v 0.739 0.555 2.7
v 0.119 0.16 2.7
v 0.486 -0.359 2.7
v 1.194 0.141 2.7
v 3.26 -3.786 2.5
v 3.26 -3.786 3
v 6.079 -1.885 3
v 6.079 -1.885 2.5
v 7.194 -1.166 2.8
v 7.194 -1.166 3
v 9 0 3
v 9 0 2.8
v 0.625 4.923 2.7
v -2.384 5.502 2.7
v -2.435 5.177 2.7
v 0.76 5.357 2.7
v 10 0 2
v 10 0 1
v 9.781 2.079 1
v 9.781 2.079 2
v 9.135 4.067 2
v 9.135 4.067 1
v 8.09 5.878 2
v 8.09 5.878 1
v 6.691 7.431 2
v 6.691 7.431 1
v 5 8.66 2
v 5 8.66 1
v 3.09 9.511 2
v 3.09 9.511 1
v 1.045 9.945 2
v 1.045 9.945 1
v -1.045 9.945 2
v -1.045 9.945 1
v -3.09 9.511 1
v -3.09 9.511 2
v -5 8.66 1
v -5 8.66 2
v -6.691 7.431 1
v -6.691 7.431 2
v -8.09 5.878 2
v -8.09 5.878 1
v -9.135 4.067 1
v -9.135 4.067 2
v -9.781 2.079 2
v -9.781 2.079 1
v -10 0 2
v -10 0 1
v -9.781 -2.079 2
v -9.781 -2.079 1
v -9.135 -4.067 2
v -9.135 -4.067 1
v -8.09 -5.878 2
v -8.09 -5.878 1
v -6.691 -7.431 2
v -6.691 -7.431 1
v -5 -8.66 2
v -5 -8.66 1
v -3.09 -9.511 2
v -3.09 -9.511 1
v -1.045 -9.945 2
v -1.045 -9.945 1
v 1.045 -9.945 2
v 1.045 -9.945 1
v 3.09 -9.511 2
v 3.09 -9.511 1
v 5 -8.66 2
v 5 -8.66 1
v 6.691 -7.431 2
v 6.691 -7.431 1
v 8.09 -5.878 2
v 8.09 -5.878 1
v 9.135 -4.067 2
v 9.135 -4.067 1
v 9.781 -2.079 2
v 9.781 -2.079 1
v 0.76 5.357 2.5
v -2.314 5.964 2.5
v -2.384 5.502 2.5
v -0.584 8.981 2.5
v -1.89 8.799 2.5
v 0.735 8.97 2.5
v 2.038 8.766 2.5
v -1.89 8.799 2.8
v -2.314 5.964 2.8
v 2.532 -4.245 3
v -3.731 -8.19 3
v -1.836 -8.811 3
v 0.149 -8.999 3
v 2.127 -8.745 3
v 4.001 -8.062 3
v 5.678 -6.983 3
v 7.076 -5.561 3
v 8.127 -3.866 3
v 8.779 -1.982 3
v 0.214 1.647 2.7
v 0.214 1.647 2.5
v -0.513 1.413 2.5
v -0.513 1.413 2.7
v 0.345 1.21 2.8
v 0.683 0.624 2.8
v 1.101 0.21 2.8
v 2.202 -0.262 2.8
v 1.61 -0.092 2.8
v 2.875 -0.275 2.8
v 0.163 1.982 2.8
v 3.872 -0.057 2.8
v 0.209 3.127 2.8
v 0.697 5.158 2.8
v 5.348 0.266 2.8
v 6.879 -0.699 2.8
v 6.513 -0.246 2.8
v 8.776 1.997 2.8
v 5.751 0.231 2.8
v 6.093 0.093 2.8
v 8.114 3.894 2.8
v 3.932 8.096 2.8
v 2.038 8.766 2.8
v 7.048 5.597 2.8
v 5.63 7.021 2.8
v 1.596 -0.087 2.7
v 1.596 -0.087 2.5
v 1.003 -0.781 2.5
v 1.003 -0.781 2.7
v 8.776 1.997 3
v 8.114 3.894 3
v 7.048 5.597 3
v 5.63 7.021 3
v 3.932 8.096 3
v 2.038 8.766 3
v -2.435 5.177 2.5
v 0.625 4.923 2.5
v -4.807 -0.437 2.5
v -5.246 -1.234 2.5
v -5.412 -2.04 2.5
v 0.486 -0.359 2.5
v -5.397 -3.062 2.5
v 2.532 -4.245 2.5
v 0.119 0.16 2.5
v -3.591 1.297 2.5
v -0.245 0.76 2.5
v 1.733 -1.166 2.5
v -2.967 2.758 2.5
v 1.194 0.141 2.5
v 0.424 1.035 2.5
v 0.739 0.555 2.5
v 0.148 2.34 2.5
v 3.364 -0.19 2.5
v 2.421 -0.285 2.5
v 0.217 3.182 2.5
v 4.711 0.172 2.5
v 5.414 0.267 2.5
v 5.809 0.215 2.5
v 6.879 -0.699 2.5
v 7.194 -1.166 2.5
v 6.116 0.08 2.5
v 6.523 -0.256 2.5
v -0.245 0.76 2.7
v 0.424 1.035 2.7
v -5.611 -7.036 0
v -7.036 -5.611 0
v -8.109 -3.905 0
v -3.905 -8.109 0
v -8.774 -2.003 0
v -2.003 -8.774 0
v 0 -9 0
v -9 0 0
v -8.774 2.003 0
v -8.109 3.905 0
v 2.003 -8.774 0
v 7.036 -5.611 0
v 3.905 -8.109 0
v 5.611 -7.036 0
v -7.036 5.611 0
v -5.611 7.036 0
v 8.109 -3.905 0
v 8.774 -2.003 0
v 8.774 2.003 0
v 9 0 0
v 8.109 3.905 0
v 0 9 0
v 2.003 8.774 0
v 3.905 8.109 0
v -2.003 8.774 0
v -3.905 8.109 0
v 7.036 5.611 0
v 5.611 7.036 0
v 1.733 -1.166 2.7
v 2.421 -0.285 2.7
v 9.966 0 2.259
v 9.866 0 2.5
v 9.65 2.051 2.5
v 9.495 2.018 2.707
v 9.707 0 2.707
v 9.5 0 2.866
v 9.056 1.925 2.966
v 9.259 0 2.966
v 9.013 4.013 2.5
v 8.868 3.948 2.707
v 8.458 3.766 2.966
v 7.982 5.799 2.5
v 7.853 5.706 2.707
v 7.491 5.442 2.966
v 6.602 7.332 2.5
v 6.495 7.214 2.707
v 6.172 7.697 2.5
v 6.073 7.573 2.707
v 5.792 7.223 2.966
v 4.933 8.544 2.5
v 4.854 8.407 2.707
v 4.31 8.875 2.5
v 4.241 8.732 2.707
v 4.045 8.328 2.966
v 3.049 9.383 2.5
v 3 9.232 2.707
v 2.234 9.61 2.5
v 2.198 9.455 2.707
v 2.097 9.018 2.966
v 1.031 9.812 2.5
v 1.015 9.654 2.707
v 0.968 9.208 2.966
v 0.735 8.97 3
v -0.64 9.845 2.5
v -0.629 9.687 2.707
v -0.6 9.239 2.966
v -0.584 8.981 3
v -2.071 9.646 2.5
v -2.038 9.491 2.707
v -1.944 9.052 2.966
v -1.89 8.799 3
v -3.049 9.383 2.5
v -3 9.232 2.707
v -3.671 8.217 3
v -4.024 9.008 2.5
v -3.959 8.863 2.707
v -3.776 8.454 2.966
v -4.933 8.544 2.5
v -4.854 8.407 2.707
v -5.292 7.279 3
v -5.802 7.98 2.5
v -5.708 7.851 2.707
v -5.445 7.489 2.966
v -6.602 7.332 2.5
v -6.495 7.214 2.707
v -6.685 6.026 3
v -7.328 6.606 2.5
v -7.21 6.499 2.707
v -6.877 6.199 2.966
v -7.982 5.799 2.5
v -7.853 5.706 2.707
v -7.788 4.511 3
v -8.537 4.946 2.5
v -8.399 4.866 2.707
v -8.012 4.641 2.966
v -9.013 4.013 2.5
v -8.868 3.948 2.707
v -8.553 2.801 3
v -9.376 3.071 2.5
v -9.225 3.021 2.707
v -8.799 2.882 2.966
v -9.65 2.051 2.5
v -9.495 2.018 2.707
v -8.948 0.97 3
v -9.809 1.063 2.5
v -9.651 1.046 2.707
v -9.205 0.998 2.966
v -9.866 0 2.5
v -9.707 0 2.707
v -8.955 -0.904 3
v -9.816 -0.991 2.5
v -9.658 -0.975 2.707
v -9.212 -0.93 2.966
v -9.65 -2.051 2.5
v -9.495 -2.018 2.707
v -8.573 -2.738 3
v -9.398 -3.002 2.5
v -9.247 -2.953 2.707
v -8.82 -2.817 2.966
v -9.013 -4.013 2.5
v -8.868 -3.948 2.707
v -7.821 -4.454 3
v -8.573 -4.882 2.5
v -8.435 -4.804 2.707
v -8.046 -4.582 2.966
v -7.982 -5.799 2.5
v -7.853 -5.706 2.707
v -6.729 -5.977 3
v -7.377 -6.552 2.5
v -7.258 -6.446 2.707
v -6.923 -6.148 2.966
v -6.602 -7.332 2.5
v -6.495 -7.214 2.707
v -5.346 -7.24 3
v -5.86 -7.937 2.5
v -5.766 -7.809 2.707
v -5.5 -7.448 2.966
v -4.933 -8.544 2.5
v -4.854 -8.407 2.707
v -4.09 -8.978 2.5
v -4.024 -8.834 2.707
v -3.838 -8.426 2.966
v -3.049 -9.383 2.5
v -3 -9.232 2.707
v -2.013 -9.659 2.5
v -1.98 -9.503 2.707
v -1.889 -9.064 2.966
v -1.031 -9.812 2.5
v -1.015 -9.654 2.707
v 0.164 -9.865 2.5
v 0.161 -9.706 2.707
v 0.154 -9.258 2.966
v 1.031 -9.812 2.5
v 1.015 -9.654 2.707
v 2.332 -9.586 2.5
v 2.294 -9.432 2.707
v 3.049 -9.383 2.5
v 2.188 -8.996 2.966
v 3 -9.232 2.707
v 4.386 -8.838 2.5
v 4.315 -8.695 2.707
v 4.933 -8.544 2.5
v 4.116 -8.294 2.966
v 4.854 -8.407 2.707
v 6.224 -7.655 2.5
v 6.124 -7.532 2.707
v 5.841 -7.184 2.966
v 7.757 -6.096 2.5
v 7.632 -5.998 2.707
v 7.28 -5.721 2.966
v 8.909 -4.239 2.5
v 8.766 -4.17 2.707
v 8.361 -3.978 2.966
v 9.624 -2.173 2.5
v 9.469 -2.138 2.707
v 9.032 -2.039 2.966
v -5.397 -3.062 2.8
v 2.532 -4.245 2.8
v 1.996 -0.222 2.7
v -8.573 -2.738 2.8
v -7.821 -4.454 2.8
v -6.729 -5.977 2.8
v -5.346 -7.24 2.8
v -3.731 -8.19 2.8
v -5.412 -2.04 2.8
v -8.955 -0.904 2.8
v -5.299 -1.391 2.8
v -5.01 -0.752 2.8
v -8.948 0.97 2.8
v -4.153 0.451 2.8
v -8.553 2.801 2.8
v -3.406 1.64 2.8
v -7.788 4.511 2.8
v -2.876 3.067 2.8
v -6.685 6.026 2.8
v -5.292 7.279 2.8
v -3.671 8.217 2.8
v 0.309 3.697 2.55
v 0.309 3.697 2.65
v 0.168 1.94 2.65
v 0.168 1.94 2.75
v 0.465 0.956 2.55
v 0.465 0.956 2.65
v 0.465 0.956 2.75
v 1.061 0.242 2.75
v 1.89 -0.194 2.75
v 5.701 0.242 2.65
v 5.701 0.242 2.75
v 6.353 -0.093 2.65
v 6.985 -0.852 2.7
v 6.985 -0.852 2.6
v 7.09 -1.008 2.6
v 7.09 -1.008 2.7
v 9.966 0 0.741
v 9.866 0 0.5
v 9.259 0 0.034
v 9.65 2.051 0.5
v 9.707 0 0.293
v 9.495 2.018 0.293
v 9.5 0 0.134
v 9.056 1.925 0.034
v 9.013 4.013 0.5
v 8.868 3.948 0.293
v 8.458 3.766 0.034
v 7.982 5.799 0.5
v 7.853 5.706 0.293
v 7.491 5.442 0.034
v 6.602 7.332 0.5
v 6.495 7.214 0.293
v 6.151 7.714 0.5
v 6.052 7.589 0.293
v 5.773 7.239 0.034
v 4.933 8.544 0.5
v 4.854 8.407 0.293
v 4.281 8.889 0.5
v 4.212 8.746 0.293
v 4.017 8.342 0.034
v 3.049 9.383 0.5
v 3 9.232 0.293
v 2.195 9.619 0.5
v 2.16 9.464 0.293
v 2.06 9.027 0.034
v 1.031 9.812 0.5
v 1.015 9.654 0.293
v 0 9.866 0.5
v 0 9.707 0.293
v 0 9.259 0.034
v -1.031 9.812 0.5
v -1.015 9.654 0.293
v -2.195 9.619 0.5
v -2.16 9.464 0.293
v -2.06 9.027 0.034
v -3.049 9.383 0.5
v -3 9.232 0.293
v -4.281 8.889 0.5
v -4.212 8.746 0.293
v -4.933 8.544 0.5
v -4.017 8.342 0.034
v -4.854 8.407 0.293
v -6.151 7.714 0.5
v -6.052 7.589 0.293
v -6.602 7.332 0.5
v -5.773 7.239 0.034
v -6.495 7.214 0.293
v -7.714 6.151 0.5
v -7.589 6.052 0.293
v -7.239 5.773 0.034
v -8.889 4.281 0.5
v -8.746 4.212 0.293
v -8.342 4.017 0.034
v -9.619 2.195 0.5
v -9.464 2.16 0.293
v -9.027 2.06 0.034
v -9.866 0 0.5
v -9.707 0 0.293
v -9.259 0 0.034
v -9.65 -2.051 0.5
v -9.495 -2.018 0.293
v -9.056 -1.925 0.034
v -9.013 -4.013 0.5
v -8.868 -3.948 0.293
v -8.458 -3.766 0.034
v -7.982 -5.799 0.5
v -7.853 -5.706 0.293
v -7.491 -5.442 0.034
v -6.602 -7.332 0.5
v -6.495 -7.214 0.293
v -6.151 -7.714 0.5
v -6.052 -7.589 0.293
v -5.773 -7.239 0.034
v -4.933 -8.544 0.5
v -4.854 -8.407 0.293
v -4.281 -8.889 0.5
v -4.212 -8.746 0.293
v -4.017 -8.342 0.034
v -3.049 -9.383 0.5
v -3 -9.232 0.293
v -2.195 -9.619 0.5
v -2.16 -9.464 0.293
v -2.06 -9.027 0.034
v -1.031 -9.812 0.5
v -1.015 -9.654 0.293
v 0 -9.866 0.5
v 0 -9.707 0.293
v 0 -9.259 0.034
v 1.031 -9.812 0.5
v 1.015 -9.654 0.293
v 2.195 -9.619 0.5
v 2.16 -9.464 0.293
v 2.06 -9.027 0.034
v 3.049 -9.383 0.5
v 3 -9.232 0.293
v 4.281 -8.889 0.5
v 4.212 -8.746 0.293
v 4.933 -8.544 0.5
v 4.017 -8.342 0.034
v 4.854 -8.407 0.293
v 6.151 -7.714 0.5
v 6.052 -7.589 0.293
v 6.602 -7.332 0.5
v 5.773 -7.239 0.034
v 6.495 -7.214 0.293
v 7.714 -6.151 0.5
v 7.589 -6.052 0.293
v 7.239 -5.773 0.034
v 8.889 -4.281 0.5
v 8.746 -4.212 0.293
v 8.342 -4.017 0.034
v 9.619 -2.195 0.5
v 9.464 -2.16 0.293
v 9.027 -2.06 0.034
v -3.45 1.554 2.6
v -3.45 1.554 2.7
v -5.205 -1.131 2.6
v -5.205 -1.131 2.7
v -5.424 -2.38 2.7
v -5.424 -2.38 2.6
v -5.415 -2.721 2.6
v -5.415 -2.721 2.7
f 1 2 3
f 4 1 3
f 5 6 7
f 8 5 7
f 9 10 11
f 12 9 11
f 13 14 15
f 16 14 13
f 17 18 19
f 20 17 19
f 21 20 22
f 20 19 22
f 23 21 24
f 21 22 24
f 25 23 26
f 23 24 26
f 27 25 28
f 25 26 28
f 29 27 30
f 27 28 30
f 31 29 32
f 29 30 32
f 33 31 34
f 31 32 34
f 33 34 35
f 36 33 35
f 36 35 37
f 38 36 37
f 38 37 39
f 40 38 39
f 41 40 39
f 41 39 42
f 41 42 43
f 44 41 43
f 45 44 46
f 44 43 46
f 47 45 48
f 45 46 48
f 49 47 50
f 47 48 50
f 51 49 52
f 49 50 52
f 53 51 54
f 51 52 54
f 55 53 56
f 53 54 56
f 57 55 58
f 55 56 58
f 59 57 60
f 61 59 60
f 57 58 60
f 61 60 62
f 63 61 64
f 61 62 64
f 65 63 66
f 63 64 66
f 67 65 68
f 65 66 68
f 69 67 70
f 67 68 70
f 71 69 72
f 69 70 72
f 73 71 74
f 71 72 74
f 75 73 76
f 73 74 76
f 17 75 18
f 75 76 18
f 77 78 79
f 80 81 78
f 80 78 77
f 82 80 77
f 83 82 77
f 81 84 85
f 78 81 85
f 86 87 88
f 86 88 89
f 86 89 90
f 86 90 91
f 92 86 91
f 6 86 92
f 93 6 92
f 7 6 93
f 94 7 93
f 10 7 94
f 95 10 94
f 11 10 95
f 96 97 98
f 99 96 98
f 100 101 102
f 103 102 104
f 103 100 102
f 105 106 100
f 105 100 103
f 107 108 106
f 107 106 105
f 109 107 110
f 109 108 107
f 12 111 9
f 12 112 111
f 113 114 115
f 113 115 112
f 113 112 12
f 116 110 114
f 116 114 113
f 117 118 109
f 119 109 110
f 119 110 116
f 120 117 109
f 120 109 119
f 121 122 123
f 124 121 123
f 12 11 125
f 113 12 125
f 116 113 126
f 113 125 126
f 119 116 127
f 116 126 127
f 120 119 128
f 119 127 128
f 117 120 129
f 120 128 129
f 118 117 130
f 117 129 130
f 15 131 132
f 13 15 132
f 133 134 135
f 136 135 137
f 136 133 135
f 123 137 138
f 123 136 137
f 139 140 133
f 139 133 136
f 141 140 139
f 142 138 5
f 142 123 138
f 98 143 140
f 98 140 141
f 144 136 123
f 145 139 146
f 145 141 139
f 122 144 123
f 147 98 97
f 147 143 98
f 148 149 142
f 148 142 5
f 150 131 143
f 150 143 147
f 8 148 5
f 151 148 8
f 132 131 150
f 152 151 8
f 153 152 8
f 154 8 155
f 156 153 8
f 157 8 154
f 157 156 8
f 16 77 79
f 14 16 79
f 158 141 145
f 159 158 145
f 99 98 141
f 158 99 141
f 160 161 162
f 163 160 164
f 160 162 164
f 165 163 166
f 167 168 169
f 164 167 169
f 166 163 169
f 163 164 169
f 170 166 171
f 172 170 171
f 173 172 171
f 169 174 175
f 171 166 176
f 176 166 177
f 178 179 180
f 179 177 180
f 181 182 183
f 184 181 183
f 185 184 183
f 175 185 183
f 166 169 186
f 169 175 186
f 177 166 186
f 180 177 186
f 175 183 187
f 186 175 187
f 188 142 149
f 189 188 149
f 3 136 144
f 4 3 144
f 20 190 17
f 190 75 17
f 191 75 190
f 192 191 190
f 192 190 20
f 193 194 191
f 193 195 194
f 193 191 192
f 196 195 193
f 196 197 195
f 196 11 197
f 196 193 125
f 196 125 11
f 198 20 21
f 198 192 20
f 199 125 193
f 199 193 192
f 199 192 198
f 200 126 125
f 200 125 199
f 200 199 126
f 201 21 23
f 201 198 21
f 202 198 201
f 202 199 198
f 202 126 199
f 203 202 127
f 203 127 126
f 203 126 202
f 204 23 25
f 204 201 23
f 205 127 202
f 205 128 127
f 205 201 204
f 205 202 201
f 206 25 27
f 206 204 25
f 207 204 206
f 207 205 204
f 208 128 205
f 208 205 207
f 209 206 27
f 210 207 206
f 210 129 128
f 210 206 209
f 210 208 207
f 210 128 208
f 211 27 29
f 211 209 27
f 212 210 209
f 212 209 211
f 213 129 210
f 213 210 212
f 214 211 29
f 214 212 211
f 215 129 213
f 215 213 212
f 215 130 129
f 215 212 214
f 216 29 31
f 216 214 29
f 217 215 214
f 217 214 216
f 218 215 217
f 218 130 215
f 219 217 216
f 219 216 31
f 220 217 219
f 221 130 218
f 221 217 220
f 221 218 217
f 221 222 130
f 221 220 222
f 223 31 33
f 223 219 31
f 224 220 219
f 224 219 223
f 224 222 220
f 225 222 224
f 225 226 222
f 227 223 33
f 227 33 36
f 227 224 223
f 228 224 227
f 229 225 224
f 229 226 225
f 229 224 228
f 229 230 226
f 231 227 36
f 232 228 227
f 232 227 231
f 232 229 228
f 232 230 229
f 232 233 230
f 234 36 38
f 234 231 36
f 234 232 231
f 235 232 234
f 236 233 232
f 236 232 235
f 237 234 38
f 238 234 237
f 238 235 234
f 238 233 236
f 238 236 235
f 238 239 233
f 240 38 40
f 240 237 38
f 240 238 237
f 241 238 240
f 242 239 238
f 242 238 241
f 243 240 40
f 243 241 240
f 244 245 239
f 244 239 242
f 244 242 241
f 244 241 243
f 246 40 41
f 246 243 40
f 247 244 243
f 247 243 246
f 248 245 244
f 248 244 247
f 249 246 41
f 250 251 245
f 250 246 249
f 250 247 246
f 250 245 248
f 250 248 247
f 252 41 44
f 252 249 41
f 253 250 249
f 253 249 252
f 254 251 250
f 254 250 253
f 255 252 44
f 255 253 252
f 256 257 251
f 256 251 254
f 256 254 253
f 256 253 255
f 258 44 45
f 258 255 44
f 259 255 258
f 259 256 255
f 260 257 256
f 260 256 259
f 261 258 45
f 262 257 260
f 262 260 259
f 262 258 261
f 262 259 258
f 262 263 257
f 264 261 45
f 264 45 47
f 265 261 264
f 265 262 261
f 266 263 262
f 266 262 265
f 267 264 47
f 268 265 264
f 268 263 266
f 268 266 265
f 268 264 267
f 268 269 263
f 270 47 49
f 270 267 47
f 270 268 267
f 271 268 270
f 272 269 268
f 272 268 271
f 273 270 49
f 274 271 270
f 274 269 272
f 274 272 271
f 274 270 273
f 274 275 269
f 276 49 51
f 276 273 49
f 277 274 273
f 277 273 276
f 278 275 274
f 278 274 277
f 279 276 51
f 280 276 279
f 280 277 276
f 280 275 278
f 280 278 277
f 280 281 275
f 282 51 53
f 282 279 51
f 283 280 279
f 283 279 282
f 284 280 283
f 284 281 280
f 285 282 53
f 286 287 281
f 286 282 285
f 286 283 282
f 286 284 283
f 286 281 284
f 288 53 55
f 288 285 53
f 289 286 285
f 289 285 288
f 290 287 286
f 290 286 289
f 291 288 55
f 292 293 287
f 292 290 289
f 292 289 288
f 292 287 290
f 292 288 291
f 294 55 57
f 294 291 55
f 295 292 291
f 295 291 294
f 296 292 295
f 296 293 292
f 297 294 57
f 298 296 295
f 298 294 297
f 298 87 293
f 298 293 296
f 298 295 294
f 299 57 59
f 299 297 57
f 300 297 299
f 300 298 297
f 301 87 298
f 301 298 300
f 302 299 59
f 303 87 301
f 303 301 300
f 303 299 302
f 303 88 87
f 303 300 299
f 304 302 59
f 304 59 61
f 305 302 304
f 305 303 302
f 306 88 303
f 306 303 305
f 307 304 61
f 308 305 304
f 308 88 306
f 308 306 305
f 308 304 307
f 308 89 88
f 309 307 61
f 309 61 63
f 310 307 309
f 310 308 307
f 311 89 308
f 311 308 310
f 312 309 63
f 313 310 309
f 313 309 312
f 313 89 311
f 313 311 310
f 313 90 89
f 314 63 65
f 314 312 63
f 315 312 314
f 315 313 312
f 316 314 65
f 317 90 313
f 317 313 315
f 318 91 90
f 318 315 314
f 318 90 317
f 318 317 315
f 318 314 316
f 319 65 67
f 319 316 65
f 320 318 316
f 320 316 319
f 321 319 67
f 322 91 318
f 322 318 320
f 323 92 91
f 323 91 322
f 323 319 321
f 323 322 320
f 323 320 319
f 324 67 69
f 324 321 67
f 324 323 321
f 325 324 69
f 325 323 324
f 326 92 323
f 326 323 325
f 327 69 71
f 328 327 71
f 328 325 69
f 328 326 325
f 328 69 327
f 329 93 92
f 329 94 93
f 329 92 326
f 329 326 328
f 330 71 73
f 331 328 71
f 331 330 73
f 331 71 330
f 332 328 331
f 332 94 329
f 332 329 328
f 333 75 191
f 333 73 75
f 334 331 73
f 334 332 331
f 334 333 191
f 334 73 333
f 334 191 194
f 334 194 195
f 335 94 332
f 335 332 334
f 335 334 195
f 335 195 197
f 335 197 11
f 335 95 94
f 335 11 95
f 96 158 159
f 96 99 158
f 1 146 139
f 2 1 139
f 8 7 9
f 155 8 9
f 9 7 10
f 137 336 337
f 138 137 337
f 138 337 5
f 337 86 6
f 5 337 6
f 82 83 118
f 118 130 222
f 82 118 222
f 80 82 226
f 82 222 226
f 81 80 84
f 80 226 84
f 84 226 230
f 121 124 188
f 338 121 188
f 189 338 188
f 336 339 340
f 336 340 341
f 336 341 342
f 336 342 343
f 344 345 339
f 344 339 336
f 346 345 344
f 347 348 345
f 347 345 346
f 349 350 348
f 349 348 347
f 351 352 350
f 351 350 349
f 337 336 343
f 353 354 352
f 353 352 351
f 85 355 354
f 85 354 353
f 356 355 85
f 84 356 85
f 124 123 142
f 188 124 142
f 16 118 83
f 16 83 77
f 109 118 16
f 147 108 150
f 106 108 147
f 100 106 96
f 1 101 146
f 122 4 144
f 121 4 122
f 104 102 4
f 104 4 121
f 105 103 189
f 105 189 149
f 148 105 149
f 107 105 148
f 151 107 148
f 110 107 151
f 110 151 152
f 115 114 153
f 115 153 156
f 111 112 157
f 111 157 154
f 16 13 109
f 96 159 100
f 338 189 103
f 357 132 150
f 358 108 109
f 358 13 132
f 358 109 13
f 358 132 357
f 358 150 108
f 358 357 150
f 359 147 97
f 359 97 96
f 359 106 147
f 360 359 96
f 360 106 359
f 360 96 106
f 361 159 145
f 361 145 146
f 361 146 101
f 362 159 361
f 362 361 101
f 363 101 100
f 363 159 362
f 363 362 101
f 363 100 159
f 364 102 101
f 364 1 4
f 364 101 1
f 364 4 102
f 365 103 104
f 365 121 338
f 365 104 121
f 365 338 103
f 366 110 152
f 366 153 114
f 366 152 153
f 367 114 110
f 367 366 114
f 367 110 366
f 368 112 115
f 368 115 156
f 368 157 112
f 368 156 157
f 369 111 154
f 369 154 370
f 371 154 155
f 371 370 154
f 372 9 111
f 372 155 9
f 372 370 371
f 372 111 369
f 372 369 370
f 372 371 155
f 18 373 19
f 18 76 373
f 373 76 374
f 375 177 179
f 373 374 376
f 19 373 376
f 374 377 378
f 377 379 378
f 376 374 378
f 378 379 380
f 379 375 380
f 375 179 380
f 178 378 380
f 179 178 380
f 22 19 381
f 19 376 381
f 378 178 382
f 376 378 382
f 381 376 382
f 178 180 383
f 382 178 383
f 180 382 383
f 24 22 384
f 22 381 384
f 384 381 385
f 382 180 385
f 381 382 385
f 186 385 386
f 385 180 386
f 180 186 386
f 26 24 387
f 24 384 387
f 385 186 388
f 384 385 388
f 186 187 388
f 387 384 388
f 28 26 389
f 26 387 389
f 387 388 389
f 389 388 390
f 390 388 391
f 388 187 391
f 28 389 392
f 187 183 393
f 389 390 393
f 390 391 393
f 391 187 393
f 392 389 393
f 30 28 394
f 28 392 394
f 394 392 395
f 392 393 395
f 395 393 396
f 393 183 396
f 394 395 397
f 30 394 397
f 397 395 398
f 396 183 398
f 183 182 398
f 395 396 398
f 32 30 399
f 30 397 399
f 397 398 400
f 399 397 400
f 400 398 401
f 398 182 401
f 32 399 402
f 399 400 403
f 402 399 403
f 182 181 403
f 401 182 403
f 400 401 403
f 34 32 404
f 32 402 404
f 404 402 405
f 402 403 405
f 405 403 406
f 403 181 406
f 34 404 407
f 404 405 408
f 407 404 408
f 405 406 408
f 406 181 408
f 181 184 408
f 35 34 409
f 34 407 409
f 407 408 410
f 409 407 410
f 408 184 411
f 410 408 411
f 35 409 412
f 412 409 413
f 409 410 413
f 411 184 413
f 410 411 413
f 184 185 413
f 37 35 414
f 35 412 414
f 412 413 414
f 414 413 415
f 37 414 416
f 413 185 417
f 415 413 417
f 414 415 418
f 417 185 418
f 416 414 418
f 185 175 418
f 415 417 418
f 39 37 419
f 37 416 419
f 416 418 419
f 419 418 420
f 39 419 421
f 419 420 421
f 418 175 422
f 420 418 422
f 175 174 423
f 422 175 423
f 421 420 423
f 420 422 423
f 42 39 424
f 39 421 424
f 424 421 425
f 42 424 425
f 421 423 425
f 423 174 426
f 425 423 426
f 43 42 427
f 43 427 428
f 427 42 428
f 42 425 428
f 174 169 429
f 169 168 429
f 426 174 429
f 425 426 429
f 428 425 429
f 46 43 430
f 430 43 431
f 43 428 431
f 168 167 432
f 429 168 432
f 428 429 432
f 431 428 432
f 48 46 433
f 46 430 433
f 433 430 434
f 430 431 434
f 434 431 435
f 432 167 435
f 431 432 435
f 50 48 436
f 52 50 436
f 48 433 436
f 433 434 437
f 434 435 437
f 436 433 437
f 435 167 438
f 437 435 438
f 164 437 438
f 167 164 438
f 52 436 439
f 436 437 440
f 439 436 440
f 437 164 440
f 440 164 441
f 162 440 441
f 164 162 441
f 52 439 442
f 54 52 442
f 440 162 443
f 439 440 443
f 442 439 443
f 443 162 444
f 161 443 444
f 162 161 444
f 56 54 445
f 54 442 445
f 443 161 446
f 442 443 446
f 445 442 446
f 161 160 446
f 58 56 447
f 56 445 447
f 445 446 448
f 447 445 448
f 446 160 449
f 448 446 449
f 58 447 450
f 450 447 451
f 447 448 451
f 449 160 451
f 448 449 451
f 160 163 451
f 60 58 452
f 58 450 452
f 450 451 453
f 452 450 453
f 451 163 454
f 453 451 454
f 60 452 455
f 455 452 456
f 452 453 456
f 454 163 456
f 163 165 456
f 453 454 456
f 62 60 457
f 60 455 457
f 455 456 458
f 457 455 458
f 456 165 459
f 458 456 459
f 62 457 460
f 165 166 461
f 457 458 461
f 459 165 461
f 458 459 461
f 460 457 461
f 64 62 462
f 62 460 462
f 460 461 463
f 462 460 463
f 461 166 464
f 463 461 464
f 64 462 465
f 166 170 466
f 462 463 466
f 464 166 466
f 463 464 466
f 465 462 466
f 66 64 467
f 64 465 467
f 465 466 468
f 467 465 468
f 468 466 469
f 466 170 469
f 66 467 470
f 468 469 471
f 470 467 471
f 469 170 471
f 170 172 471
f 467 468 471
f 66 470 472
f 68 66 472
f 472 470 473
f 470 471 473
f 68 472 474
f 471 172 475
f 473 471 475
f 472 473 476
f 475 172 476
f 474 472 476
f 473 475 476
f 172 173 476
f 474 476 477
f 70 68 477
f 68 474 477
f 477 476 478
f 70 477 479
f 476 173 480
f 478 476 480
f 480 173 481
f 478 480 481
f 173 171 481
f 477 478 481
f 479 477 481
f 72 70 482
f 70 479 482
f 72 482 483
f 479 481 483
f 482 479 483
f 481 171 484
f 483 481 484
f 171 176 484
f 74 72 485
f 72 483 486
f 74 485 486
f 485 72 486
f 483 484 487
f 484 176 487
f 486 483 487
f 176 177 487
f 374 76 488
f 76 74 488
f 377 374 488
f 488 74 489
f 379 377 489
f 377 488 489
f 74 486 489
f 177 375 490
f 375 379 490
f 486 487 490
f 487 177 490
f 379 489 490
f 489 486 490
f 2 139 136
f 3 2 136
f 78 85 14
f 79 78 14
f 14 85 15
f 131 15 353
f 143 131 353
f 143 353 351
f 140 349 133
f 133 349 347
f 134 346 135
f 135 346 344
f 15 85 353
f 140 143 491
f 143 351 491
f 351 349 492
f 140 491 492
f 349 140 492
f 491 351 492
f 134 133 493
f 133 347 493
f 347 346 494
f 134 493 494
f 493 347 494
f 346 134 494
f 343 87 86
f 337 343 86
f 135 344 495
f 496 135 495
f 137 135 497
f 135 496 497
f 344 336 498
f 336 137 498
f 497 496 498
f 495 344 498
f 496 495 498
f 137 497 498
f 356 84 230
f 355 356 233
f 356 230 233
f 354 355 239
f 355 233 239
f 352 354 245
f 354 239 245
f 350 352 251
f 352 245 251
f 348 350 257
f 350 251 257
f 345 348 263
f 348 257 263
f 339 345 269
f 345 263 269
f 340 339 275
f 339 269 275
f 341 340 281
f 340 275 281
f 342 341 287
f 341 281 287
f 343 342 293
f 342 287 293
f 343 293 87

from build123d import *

# Parameters (mm, degrees)
F0_R      = 10
F1_DEPTH  = 3
F2_R      = 1
F4_DEPTH  = 0.5
F5_DEPTH  = 0.5
F7_DEPTH  = 0.2
F8_DEPTH  = 0.2
F10_DEPTH = 0.2


with BuildPart() as f1:
    # F0 (on Top) → F1 (new body)
    with BuildSketch(Plane.XY):
        Circle(F0_R)
    extrude(amount=F1_DEPTH)

    # F2
    f2_edges = [f1.edges().sort_by_distance(p)[0] for p in [
        (-10, 0, 3),
        (-10, 0, 0),
    ]]
    fillet(f2_edges, radius=F2_R)

    # F3 (on face) → F4 (cut)
    with BuildSketch(Plane.XY.offset(3)):
        with BuildLine():
            Line((2.6188242033, -3.3776305377), (6.8794322408, -0.6989099297))
            add(Edge.make_bspline(
                [(2.0379616312, 8.7662256639), (1.6297293118, 7.760927147), (0.7947254097, 5.7046759771), (-0.2158731788, 1.9761788849), (0.9164418768, 0.0642277289), (2.929304388, -0.6172304518), (5.6350925737, 0.7468103985), (6.5537268756, -0.2412183766), (6.8794322408, -0.6989099297)],
                knots=[0, 0, 0, 0, 0.1908238507, 0.3903136826, 0.5337501788, 0.6776846025, 0.8516922871, 0.9633032231, 0.9633032231, 0.9633032231, 0.9633032231], degree=3))
            ThreePointArc((2.0379616312, 8.7662256639), (0.0759866512, 8.9996792181), (-1.8896505536, 8.7993875233))
            Line((-1.8896505536, 8.7993875233), (-2.3143994622, 5.9643280692))
            add(Edge.make_bspline(
                [(-2.3143994622, 5.9643280692), (-2.5209566799, 4.5856267279), (-2.998613389, 1.3974263723), (-5.1744957464, -0.6070257438), (-5.3903894892, -1.7340637252), (-5.4123916936, -2.0398823468)],
                knots=[0.2414805871, 0.2414805871, 0.2414805871, 0.2414805871, 0.5458400785, 0.8012843993, 0.8955104519, 0.8955104519, 0.8955104519, 0.8955104519], degree=3))
            Line((-5.4123916936, -2.0398823468), (2.6188242033, -3.3776305377))
        make_face()
    extrude(amount=-F4_DEPTH, mode=Mode.SUBTRACT)

    # F3 (on face) → F5 (cut)
    with BuildSketch(Plane.XY.offset(3)):
        with BuildLine():
            Line((3.2604557928, -3.7864416372), (6.0787242837, -1.8852878129))
            Line((6.0787242837, -1.8852878129), (7.1935072074, -1.1658464236))
            add(Edge.make_bspline(
                [(6.8794322408, -0.6989099297), (6.9865215417, -0.8493952261), (7.0900143745, -1.0076208248), (7.1935072074, -1.1658464236)],
                knots=[0.9633032231, 0.9633032231, 0.9633032231, 0.9633032231, 1, 1, 1, 1], degree=3))
            Line((6.8794322408, -0.6989099297), (2.6188242033, -3.3776305377))
            Line((2.6188242033, -3.3776305377), (-5.4123916936, -2.0398823468))
            add(Edge.make_bspline(
                [(-5.4123916936, -2.0398823468), (-5.4367904701, -2.3790120105), (-5.4167044889, -2.720741879), (-5.3966185078, -3.0624717474)],
                knots=[0.8955104519, 0.8955104519, 0.8955104519, 0.8955104519, 1, 1, 1, 1], degree=3))
            Line((-5.3966185078, -3.0624717474), (2.5323872936, -4.2450306214))
            Line((2.5323872936, -4.2450306214), (3.2604557928, -3.7864416372))
        make_face()
    extrude(amount=-F5_DEPTH, mode=Mode.SUBTRACT)

    # F6 (on face) → F7 (join)
    with BuildSketch(Plane.XY.offset(2.5)):
        with BuildLine():
            add(Edge.make_bspline(
                [(-2.3842653189, 5.5020927108), (-2.400709991, 5.3951104015), (-2.4176575323, 5.2866589487), (-2.4352520085, 5.1770578662)],
                knots=[0.2746404016, 0.2746404016, 0.2746404016, 0.2746404016, 0.2971489273, 0.2971489273, 0.2971489273, 0.2971489273], degree=3))
            Line((-2.4352520085, 5.1770578662), (0.625273791, 4.9229885711))
            add(Edge.make_bspline(
                [(0.760314553, 5.3573187551), (0.7143347288, 5.2141615037), (0.6690819594, 5.0691118902), (0.625273791, 4.9229885711)],
                knots=[0.2034219896, 0.2034219896, 0.2034219896, 0.2034219896, 0.2264819887, 0.2264819887, 0.2264819887, 0.2264819887], degree=3))
            Line((0.760314553, 5.3573187551), (-2.3842653189, 5.5020927108))
        make_face()
    extrude(amount=F7_DEPTH)

    # F3 (on face) → F8 (cut)
    with BuildSketch(Plane.XY.offset(3)):
        with BuildLine():
            Line((-3.7310567152, -8.1901902169), (2.5323872936, -4.2450306214))
            Line((2.5323872936, -4.2450306214), (-5.3966185078, -3.0624717474))
            add(Edge.make_bspline(
                [(-5.4123916936, -2.0398823468), (-5.4367904701, -2.3790120105), (-5.4167044889, -2.720741879), (-5.3966185078, -3.0624717474)],
                knots=[0.8955104519, 0.8955104519, 0.8955104519, 0.8955104519, 1, 1, 1, 1], degree=3))
            add(Edge.make_bspline(
                [(-2.3143994622, 5.9643280692), (-2.5209566799, 4.5856267279), (-2.998613389, 1.3974263723), (-5.1744957464, -0.6070257438), (-5.3903894892, -1.7340637252), (-5.4123916936, -2.0398823468)],
                knots=[0.2414805871, 0.2414805871, 0.2414805871, 0.2414805871, 0.5458400785, 0.8012843993, 0.8955104519, 0.8955104519, 0.8955104519, 0.8955104519], degree=3))
            Line((-2.3143994622, 5.9643280692), (-1.8896505536, 8.7993875233))
            ThreePointArc((-1.8896505536, 8.7993875233), (-8.9475988677, 0.9697806466), (-3.7310567152, -8.1901902169))
        make_face()
        with BuildLine():
            add(Edge.make_bspline(
                [(6.8794322408, -0.6989099297), (6.9865215417, -0.8493952261), (7.0900143745, -1.0076208248), (7.1935072074, -1.1658464236)],
                knots=[0.9633032231, 0.9633032231, 0.9633032231, 0.9633032231, 1, 1, 1, 1], degree=3))
            Line((7.1935072074, -1.1658464236), (9, 0))
            ThreePointArc((9, 0), (7.0477533541, 5.5972468822), (2.0379616312, 8.7662256639))
            add(Edge.make_bspline(
                [(2.0379616312, 8.7662256639), (1.6297293118, 7.760927147), (0.7947254097, 5.7046759771), (-0.2158731788, 1.9761788849), (0.9164418768, 0.0642277289), (2.929304388, -0.6172304518), (5.6350925737, 0.7468103985), (6.5537268756, -0.2412183766), (6.8794322408, -0.6989099297)],
                knots=[0, 0, 0, 0, 0.1908238507, 0.3903136826, 0.5337501788, 0.6776846025, 0.8516922871, 0.9633032231, 0.9633032231, 0.9633032231, 0.9633032231], degree=3))
        make_face()
    extrude(amount=-F8_DEPTH, mode=Mode.SUBTRACT)

    # F9 (on face) → F10 (join)
    with BuildSketch(Plane.XY.offset(2.5)):
        Polygon((0.4235866599, 1.0353629961), (0.2137521335, 1.6472745719), (-0.5133344134, 1.4130915244), (-0.2446945873, 0.7603343111), align=None)
        Polygon((1.1939833379, 0.1412997616), (0.7390651665, 0.5554548462), (0.1189987625, 0.1596583386), (0.4858149623, -0.3592776484), align=None)
        Polygon((2.4212828624, -0.2853942997), (1.5963621816, -0.0867172381), (1.0029768368, -0.780917181), (1.7334064469, -1.1658464236), align=None)
    extrude(amount=F10_DEPTH)


solid = f1.part
